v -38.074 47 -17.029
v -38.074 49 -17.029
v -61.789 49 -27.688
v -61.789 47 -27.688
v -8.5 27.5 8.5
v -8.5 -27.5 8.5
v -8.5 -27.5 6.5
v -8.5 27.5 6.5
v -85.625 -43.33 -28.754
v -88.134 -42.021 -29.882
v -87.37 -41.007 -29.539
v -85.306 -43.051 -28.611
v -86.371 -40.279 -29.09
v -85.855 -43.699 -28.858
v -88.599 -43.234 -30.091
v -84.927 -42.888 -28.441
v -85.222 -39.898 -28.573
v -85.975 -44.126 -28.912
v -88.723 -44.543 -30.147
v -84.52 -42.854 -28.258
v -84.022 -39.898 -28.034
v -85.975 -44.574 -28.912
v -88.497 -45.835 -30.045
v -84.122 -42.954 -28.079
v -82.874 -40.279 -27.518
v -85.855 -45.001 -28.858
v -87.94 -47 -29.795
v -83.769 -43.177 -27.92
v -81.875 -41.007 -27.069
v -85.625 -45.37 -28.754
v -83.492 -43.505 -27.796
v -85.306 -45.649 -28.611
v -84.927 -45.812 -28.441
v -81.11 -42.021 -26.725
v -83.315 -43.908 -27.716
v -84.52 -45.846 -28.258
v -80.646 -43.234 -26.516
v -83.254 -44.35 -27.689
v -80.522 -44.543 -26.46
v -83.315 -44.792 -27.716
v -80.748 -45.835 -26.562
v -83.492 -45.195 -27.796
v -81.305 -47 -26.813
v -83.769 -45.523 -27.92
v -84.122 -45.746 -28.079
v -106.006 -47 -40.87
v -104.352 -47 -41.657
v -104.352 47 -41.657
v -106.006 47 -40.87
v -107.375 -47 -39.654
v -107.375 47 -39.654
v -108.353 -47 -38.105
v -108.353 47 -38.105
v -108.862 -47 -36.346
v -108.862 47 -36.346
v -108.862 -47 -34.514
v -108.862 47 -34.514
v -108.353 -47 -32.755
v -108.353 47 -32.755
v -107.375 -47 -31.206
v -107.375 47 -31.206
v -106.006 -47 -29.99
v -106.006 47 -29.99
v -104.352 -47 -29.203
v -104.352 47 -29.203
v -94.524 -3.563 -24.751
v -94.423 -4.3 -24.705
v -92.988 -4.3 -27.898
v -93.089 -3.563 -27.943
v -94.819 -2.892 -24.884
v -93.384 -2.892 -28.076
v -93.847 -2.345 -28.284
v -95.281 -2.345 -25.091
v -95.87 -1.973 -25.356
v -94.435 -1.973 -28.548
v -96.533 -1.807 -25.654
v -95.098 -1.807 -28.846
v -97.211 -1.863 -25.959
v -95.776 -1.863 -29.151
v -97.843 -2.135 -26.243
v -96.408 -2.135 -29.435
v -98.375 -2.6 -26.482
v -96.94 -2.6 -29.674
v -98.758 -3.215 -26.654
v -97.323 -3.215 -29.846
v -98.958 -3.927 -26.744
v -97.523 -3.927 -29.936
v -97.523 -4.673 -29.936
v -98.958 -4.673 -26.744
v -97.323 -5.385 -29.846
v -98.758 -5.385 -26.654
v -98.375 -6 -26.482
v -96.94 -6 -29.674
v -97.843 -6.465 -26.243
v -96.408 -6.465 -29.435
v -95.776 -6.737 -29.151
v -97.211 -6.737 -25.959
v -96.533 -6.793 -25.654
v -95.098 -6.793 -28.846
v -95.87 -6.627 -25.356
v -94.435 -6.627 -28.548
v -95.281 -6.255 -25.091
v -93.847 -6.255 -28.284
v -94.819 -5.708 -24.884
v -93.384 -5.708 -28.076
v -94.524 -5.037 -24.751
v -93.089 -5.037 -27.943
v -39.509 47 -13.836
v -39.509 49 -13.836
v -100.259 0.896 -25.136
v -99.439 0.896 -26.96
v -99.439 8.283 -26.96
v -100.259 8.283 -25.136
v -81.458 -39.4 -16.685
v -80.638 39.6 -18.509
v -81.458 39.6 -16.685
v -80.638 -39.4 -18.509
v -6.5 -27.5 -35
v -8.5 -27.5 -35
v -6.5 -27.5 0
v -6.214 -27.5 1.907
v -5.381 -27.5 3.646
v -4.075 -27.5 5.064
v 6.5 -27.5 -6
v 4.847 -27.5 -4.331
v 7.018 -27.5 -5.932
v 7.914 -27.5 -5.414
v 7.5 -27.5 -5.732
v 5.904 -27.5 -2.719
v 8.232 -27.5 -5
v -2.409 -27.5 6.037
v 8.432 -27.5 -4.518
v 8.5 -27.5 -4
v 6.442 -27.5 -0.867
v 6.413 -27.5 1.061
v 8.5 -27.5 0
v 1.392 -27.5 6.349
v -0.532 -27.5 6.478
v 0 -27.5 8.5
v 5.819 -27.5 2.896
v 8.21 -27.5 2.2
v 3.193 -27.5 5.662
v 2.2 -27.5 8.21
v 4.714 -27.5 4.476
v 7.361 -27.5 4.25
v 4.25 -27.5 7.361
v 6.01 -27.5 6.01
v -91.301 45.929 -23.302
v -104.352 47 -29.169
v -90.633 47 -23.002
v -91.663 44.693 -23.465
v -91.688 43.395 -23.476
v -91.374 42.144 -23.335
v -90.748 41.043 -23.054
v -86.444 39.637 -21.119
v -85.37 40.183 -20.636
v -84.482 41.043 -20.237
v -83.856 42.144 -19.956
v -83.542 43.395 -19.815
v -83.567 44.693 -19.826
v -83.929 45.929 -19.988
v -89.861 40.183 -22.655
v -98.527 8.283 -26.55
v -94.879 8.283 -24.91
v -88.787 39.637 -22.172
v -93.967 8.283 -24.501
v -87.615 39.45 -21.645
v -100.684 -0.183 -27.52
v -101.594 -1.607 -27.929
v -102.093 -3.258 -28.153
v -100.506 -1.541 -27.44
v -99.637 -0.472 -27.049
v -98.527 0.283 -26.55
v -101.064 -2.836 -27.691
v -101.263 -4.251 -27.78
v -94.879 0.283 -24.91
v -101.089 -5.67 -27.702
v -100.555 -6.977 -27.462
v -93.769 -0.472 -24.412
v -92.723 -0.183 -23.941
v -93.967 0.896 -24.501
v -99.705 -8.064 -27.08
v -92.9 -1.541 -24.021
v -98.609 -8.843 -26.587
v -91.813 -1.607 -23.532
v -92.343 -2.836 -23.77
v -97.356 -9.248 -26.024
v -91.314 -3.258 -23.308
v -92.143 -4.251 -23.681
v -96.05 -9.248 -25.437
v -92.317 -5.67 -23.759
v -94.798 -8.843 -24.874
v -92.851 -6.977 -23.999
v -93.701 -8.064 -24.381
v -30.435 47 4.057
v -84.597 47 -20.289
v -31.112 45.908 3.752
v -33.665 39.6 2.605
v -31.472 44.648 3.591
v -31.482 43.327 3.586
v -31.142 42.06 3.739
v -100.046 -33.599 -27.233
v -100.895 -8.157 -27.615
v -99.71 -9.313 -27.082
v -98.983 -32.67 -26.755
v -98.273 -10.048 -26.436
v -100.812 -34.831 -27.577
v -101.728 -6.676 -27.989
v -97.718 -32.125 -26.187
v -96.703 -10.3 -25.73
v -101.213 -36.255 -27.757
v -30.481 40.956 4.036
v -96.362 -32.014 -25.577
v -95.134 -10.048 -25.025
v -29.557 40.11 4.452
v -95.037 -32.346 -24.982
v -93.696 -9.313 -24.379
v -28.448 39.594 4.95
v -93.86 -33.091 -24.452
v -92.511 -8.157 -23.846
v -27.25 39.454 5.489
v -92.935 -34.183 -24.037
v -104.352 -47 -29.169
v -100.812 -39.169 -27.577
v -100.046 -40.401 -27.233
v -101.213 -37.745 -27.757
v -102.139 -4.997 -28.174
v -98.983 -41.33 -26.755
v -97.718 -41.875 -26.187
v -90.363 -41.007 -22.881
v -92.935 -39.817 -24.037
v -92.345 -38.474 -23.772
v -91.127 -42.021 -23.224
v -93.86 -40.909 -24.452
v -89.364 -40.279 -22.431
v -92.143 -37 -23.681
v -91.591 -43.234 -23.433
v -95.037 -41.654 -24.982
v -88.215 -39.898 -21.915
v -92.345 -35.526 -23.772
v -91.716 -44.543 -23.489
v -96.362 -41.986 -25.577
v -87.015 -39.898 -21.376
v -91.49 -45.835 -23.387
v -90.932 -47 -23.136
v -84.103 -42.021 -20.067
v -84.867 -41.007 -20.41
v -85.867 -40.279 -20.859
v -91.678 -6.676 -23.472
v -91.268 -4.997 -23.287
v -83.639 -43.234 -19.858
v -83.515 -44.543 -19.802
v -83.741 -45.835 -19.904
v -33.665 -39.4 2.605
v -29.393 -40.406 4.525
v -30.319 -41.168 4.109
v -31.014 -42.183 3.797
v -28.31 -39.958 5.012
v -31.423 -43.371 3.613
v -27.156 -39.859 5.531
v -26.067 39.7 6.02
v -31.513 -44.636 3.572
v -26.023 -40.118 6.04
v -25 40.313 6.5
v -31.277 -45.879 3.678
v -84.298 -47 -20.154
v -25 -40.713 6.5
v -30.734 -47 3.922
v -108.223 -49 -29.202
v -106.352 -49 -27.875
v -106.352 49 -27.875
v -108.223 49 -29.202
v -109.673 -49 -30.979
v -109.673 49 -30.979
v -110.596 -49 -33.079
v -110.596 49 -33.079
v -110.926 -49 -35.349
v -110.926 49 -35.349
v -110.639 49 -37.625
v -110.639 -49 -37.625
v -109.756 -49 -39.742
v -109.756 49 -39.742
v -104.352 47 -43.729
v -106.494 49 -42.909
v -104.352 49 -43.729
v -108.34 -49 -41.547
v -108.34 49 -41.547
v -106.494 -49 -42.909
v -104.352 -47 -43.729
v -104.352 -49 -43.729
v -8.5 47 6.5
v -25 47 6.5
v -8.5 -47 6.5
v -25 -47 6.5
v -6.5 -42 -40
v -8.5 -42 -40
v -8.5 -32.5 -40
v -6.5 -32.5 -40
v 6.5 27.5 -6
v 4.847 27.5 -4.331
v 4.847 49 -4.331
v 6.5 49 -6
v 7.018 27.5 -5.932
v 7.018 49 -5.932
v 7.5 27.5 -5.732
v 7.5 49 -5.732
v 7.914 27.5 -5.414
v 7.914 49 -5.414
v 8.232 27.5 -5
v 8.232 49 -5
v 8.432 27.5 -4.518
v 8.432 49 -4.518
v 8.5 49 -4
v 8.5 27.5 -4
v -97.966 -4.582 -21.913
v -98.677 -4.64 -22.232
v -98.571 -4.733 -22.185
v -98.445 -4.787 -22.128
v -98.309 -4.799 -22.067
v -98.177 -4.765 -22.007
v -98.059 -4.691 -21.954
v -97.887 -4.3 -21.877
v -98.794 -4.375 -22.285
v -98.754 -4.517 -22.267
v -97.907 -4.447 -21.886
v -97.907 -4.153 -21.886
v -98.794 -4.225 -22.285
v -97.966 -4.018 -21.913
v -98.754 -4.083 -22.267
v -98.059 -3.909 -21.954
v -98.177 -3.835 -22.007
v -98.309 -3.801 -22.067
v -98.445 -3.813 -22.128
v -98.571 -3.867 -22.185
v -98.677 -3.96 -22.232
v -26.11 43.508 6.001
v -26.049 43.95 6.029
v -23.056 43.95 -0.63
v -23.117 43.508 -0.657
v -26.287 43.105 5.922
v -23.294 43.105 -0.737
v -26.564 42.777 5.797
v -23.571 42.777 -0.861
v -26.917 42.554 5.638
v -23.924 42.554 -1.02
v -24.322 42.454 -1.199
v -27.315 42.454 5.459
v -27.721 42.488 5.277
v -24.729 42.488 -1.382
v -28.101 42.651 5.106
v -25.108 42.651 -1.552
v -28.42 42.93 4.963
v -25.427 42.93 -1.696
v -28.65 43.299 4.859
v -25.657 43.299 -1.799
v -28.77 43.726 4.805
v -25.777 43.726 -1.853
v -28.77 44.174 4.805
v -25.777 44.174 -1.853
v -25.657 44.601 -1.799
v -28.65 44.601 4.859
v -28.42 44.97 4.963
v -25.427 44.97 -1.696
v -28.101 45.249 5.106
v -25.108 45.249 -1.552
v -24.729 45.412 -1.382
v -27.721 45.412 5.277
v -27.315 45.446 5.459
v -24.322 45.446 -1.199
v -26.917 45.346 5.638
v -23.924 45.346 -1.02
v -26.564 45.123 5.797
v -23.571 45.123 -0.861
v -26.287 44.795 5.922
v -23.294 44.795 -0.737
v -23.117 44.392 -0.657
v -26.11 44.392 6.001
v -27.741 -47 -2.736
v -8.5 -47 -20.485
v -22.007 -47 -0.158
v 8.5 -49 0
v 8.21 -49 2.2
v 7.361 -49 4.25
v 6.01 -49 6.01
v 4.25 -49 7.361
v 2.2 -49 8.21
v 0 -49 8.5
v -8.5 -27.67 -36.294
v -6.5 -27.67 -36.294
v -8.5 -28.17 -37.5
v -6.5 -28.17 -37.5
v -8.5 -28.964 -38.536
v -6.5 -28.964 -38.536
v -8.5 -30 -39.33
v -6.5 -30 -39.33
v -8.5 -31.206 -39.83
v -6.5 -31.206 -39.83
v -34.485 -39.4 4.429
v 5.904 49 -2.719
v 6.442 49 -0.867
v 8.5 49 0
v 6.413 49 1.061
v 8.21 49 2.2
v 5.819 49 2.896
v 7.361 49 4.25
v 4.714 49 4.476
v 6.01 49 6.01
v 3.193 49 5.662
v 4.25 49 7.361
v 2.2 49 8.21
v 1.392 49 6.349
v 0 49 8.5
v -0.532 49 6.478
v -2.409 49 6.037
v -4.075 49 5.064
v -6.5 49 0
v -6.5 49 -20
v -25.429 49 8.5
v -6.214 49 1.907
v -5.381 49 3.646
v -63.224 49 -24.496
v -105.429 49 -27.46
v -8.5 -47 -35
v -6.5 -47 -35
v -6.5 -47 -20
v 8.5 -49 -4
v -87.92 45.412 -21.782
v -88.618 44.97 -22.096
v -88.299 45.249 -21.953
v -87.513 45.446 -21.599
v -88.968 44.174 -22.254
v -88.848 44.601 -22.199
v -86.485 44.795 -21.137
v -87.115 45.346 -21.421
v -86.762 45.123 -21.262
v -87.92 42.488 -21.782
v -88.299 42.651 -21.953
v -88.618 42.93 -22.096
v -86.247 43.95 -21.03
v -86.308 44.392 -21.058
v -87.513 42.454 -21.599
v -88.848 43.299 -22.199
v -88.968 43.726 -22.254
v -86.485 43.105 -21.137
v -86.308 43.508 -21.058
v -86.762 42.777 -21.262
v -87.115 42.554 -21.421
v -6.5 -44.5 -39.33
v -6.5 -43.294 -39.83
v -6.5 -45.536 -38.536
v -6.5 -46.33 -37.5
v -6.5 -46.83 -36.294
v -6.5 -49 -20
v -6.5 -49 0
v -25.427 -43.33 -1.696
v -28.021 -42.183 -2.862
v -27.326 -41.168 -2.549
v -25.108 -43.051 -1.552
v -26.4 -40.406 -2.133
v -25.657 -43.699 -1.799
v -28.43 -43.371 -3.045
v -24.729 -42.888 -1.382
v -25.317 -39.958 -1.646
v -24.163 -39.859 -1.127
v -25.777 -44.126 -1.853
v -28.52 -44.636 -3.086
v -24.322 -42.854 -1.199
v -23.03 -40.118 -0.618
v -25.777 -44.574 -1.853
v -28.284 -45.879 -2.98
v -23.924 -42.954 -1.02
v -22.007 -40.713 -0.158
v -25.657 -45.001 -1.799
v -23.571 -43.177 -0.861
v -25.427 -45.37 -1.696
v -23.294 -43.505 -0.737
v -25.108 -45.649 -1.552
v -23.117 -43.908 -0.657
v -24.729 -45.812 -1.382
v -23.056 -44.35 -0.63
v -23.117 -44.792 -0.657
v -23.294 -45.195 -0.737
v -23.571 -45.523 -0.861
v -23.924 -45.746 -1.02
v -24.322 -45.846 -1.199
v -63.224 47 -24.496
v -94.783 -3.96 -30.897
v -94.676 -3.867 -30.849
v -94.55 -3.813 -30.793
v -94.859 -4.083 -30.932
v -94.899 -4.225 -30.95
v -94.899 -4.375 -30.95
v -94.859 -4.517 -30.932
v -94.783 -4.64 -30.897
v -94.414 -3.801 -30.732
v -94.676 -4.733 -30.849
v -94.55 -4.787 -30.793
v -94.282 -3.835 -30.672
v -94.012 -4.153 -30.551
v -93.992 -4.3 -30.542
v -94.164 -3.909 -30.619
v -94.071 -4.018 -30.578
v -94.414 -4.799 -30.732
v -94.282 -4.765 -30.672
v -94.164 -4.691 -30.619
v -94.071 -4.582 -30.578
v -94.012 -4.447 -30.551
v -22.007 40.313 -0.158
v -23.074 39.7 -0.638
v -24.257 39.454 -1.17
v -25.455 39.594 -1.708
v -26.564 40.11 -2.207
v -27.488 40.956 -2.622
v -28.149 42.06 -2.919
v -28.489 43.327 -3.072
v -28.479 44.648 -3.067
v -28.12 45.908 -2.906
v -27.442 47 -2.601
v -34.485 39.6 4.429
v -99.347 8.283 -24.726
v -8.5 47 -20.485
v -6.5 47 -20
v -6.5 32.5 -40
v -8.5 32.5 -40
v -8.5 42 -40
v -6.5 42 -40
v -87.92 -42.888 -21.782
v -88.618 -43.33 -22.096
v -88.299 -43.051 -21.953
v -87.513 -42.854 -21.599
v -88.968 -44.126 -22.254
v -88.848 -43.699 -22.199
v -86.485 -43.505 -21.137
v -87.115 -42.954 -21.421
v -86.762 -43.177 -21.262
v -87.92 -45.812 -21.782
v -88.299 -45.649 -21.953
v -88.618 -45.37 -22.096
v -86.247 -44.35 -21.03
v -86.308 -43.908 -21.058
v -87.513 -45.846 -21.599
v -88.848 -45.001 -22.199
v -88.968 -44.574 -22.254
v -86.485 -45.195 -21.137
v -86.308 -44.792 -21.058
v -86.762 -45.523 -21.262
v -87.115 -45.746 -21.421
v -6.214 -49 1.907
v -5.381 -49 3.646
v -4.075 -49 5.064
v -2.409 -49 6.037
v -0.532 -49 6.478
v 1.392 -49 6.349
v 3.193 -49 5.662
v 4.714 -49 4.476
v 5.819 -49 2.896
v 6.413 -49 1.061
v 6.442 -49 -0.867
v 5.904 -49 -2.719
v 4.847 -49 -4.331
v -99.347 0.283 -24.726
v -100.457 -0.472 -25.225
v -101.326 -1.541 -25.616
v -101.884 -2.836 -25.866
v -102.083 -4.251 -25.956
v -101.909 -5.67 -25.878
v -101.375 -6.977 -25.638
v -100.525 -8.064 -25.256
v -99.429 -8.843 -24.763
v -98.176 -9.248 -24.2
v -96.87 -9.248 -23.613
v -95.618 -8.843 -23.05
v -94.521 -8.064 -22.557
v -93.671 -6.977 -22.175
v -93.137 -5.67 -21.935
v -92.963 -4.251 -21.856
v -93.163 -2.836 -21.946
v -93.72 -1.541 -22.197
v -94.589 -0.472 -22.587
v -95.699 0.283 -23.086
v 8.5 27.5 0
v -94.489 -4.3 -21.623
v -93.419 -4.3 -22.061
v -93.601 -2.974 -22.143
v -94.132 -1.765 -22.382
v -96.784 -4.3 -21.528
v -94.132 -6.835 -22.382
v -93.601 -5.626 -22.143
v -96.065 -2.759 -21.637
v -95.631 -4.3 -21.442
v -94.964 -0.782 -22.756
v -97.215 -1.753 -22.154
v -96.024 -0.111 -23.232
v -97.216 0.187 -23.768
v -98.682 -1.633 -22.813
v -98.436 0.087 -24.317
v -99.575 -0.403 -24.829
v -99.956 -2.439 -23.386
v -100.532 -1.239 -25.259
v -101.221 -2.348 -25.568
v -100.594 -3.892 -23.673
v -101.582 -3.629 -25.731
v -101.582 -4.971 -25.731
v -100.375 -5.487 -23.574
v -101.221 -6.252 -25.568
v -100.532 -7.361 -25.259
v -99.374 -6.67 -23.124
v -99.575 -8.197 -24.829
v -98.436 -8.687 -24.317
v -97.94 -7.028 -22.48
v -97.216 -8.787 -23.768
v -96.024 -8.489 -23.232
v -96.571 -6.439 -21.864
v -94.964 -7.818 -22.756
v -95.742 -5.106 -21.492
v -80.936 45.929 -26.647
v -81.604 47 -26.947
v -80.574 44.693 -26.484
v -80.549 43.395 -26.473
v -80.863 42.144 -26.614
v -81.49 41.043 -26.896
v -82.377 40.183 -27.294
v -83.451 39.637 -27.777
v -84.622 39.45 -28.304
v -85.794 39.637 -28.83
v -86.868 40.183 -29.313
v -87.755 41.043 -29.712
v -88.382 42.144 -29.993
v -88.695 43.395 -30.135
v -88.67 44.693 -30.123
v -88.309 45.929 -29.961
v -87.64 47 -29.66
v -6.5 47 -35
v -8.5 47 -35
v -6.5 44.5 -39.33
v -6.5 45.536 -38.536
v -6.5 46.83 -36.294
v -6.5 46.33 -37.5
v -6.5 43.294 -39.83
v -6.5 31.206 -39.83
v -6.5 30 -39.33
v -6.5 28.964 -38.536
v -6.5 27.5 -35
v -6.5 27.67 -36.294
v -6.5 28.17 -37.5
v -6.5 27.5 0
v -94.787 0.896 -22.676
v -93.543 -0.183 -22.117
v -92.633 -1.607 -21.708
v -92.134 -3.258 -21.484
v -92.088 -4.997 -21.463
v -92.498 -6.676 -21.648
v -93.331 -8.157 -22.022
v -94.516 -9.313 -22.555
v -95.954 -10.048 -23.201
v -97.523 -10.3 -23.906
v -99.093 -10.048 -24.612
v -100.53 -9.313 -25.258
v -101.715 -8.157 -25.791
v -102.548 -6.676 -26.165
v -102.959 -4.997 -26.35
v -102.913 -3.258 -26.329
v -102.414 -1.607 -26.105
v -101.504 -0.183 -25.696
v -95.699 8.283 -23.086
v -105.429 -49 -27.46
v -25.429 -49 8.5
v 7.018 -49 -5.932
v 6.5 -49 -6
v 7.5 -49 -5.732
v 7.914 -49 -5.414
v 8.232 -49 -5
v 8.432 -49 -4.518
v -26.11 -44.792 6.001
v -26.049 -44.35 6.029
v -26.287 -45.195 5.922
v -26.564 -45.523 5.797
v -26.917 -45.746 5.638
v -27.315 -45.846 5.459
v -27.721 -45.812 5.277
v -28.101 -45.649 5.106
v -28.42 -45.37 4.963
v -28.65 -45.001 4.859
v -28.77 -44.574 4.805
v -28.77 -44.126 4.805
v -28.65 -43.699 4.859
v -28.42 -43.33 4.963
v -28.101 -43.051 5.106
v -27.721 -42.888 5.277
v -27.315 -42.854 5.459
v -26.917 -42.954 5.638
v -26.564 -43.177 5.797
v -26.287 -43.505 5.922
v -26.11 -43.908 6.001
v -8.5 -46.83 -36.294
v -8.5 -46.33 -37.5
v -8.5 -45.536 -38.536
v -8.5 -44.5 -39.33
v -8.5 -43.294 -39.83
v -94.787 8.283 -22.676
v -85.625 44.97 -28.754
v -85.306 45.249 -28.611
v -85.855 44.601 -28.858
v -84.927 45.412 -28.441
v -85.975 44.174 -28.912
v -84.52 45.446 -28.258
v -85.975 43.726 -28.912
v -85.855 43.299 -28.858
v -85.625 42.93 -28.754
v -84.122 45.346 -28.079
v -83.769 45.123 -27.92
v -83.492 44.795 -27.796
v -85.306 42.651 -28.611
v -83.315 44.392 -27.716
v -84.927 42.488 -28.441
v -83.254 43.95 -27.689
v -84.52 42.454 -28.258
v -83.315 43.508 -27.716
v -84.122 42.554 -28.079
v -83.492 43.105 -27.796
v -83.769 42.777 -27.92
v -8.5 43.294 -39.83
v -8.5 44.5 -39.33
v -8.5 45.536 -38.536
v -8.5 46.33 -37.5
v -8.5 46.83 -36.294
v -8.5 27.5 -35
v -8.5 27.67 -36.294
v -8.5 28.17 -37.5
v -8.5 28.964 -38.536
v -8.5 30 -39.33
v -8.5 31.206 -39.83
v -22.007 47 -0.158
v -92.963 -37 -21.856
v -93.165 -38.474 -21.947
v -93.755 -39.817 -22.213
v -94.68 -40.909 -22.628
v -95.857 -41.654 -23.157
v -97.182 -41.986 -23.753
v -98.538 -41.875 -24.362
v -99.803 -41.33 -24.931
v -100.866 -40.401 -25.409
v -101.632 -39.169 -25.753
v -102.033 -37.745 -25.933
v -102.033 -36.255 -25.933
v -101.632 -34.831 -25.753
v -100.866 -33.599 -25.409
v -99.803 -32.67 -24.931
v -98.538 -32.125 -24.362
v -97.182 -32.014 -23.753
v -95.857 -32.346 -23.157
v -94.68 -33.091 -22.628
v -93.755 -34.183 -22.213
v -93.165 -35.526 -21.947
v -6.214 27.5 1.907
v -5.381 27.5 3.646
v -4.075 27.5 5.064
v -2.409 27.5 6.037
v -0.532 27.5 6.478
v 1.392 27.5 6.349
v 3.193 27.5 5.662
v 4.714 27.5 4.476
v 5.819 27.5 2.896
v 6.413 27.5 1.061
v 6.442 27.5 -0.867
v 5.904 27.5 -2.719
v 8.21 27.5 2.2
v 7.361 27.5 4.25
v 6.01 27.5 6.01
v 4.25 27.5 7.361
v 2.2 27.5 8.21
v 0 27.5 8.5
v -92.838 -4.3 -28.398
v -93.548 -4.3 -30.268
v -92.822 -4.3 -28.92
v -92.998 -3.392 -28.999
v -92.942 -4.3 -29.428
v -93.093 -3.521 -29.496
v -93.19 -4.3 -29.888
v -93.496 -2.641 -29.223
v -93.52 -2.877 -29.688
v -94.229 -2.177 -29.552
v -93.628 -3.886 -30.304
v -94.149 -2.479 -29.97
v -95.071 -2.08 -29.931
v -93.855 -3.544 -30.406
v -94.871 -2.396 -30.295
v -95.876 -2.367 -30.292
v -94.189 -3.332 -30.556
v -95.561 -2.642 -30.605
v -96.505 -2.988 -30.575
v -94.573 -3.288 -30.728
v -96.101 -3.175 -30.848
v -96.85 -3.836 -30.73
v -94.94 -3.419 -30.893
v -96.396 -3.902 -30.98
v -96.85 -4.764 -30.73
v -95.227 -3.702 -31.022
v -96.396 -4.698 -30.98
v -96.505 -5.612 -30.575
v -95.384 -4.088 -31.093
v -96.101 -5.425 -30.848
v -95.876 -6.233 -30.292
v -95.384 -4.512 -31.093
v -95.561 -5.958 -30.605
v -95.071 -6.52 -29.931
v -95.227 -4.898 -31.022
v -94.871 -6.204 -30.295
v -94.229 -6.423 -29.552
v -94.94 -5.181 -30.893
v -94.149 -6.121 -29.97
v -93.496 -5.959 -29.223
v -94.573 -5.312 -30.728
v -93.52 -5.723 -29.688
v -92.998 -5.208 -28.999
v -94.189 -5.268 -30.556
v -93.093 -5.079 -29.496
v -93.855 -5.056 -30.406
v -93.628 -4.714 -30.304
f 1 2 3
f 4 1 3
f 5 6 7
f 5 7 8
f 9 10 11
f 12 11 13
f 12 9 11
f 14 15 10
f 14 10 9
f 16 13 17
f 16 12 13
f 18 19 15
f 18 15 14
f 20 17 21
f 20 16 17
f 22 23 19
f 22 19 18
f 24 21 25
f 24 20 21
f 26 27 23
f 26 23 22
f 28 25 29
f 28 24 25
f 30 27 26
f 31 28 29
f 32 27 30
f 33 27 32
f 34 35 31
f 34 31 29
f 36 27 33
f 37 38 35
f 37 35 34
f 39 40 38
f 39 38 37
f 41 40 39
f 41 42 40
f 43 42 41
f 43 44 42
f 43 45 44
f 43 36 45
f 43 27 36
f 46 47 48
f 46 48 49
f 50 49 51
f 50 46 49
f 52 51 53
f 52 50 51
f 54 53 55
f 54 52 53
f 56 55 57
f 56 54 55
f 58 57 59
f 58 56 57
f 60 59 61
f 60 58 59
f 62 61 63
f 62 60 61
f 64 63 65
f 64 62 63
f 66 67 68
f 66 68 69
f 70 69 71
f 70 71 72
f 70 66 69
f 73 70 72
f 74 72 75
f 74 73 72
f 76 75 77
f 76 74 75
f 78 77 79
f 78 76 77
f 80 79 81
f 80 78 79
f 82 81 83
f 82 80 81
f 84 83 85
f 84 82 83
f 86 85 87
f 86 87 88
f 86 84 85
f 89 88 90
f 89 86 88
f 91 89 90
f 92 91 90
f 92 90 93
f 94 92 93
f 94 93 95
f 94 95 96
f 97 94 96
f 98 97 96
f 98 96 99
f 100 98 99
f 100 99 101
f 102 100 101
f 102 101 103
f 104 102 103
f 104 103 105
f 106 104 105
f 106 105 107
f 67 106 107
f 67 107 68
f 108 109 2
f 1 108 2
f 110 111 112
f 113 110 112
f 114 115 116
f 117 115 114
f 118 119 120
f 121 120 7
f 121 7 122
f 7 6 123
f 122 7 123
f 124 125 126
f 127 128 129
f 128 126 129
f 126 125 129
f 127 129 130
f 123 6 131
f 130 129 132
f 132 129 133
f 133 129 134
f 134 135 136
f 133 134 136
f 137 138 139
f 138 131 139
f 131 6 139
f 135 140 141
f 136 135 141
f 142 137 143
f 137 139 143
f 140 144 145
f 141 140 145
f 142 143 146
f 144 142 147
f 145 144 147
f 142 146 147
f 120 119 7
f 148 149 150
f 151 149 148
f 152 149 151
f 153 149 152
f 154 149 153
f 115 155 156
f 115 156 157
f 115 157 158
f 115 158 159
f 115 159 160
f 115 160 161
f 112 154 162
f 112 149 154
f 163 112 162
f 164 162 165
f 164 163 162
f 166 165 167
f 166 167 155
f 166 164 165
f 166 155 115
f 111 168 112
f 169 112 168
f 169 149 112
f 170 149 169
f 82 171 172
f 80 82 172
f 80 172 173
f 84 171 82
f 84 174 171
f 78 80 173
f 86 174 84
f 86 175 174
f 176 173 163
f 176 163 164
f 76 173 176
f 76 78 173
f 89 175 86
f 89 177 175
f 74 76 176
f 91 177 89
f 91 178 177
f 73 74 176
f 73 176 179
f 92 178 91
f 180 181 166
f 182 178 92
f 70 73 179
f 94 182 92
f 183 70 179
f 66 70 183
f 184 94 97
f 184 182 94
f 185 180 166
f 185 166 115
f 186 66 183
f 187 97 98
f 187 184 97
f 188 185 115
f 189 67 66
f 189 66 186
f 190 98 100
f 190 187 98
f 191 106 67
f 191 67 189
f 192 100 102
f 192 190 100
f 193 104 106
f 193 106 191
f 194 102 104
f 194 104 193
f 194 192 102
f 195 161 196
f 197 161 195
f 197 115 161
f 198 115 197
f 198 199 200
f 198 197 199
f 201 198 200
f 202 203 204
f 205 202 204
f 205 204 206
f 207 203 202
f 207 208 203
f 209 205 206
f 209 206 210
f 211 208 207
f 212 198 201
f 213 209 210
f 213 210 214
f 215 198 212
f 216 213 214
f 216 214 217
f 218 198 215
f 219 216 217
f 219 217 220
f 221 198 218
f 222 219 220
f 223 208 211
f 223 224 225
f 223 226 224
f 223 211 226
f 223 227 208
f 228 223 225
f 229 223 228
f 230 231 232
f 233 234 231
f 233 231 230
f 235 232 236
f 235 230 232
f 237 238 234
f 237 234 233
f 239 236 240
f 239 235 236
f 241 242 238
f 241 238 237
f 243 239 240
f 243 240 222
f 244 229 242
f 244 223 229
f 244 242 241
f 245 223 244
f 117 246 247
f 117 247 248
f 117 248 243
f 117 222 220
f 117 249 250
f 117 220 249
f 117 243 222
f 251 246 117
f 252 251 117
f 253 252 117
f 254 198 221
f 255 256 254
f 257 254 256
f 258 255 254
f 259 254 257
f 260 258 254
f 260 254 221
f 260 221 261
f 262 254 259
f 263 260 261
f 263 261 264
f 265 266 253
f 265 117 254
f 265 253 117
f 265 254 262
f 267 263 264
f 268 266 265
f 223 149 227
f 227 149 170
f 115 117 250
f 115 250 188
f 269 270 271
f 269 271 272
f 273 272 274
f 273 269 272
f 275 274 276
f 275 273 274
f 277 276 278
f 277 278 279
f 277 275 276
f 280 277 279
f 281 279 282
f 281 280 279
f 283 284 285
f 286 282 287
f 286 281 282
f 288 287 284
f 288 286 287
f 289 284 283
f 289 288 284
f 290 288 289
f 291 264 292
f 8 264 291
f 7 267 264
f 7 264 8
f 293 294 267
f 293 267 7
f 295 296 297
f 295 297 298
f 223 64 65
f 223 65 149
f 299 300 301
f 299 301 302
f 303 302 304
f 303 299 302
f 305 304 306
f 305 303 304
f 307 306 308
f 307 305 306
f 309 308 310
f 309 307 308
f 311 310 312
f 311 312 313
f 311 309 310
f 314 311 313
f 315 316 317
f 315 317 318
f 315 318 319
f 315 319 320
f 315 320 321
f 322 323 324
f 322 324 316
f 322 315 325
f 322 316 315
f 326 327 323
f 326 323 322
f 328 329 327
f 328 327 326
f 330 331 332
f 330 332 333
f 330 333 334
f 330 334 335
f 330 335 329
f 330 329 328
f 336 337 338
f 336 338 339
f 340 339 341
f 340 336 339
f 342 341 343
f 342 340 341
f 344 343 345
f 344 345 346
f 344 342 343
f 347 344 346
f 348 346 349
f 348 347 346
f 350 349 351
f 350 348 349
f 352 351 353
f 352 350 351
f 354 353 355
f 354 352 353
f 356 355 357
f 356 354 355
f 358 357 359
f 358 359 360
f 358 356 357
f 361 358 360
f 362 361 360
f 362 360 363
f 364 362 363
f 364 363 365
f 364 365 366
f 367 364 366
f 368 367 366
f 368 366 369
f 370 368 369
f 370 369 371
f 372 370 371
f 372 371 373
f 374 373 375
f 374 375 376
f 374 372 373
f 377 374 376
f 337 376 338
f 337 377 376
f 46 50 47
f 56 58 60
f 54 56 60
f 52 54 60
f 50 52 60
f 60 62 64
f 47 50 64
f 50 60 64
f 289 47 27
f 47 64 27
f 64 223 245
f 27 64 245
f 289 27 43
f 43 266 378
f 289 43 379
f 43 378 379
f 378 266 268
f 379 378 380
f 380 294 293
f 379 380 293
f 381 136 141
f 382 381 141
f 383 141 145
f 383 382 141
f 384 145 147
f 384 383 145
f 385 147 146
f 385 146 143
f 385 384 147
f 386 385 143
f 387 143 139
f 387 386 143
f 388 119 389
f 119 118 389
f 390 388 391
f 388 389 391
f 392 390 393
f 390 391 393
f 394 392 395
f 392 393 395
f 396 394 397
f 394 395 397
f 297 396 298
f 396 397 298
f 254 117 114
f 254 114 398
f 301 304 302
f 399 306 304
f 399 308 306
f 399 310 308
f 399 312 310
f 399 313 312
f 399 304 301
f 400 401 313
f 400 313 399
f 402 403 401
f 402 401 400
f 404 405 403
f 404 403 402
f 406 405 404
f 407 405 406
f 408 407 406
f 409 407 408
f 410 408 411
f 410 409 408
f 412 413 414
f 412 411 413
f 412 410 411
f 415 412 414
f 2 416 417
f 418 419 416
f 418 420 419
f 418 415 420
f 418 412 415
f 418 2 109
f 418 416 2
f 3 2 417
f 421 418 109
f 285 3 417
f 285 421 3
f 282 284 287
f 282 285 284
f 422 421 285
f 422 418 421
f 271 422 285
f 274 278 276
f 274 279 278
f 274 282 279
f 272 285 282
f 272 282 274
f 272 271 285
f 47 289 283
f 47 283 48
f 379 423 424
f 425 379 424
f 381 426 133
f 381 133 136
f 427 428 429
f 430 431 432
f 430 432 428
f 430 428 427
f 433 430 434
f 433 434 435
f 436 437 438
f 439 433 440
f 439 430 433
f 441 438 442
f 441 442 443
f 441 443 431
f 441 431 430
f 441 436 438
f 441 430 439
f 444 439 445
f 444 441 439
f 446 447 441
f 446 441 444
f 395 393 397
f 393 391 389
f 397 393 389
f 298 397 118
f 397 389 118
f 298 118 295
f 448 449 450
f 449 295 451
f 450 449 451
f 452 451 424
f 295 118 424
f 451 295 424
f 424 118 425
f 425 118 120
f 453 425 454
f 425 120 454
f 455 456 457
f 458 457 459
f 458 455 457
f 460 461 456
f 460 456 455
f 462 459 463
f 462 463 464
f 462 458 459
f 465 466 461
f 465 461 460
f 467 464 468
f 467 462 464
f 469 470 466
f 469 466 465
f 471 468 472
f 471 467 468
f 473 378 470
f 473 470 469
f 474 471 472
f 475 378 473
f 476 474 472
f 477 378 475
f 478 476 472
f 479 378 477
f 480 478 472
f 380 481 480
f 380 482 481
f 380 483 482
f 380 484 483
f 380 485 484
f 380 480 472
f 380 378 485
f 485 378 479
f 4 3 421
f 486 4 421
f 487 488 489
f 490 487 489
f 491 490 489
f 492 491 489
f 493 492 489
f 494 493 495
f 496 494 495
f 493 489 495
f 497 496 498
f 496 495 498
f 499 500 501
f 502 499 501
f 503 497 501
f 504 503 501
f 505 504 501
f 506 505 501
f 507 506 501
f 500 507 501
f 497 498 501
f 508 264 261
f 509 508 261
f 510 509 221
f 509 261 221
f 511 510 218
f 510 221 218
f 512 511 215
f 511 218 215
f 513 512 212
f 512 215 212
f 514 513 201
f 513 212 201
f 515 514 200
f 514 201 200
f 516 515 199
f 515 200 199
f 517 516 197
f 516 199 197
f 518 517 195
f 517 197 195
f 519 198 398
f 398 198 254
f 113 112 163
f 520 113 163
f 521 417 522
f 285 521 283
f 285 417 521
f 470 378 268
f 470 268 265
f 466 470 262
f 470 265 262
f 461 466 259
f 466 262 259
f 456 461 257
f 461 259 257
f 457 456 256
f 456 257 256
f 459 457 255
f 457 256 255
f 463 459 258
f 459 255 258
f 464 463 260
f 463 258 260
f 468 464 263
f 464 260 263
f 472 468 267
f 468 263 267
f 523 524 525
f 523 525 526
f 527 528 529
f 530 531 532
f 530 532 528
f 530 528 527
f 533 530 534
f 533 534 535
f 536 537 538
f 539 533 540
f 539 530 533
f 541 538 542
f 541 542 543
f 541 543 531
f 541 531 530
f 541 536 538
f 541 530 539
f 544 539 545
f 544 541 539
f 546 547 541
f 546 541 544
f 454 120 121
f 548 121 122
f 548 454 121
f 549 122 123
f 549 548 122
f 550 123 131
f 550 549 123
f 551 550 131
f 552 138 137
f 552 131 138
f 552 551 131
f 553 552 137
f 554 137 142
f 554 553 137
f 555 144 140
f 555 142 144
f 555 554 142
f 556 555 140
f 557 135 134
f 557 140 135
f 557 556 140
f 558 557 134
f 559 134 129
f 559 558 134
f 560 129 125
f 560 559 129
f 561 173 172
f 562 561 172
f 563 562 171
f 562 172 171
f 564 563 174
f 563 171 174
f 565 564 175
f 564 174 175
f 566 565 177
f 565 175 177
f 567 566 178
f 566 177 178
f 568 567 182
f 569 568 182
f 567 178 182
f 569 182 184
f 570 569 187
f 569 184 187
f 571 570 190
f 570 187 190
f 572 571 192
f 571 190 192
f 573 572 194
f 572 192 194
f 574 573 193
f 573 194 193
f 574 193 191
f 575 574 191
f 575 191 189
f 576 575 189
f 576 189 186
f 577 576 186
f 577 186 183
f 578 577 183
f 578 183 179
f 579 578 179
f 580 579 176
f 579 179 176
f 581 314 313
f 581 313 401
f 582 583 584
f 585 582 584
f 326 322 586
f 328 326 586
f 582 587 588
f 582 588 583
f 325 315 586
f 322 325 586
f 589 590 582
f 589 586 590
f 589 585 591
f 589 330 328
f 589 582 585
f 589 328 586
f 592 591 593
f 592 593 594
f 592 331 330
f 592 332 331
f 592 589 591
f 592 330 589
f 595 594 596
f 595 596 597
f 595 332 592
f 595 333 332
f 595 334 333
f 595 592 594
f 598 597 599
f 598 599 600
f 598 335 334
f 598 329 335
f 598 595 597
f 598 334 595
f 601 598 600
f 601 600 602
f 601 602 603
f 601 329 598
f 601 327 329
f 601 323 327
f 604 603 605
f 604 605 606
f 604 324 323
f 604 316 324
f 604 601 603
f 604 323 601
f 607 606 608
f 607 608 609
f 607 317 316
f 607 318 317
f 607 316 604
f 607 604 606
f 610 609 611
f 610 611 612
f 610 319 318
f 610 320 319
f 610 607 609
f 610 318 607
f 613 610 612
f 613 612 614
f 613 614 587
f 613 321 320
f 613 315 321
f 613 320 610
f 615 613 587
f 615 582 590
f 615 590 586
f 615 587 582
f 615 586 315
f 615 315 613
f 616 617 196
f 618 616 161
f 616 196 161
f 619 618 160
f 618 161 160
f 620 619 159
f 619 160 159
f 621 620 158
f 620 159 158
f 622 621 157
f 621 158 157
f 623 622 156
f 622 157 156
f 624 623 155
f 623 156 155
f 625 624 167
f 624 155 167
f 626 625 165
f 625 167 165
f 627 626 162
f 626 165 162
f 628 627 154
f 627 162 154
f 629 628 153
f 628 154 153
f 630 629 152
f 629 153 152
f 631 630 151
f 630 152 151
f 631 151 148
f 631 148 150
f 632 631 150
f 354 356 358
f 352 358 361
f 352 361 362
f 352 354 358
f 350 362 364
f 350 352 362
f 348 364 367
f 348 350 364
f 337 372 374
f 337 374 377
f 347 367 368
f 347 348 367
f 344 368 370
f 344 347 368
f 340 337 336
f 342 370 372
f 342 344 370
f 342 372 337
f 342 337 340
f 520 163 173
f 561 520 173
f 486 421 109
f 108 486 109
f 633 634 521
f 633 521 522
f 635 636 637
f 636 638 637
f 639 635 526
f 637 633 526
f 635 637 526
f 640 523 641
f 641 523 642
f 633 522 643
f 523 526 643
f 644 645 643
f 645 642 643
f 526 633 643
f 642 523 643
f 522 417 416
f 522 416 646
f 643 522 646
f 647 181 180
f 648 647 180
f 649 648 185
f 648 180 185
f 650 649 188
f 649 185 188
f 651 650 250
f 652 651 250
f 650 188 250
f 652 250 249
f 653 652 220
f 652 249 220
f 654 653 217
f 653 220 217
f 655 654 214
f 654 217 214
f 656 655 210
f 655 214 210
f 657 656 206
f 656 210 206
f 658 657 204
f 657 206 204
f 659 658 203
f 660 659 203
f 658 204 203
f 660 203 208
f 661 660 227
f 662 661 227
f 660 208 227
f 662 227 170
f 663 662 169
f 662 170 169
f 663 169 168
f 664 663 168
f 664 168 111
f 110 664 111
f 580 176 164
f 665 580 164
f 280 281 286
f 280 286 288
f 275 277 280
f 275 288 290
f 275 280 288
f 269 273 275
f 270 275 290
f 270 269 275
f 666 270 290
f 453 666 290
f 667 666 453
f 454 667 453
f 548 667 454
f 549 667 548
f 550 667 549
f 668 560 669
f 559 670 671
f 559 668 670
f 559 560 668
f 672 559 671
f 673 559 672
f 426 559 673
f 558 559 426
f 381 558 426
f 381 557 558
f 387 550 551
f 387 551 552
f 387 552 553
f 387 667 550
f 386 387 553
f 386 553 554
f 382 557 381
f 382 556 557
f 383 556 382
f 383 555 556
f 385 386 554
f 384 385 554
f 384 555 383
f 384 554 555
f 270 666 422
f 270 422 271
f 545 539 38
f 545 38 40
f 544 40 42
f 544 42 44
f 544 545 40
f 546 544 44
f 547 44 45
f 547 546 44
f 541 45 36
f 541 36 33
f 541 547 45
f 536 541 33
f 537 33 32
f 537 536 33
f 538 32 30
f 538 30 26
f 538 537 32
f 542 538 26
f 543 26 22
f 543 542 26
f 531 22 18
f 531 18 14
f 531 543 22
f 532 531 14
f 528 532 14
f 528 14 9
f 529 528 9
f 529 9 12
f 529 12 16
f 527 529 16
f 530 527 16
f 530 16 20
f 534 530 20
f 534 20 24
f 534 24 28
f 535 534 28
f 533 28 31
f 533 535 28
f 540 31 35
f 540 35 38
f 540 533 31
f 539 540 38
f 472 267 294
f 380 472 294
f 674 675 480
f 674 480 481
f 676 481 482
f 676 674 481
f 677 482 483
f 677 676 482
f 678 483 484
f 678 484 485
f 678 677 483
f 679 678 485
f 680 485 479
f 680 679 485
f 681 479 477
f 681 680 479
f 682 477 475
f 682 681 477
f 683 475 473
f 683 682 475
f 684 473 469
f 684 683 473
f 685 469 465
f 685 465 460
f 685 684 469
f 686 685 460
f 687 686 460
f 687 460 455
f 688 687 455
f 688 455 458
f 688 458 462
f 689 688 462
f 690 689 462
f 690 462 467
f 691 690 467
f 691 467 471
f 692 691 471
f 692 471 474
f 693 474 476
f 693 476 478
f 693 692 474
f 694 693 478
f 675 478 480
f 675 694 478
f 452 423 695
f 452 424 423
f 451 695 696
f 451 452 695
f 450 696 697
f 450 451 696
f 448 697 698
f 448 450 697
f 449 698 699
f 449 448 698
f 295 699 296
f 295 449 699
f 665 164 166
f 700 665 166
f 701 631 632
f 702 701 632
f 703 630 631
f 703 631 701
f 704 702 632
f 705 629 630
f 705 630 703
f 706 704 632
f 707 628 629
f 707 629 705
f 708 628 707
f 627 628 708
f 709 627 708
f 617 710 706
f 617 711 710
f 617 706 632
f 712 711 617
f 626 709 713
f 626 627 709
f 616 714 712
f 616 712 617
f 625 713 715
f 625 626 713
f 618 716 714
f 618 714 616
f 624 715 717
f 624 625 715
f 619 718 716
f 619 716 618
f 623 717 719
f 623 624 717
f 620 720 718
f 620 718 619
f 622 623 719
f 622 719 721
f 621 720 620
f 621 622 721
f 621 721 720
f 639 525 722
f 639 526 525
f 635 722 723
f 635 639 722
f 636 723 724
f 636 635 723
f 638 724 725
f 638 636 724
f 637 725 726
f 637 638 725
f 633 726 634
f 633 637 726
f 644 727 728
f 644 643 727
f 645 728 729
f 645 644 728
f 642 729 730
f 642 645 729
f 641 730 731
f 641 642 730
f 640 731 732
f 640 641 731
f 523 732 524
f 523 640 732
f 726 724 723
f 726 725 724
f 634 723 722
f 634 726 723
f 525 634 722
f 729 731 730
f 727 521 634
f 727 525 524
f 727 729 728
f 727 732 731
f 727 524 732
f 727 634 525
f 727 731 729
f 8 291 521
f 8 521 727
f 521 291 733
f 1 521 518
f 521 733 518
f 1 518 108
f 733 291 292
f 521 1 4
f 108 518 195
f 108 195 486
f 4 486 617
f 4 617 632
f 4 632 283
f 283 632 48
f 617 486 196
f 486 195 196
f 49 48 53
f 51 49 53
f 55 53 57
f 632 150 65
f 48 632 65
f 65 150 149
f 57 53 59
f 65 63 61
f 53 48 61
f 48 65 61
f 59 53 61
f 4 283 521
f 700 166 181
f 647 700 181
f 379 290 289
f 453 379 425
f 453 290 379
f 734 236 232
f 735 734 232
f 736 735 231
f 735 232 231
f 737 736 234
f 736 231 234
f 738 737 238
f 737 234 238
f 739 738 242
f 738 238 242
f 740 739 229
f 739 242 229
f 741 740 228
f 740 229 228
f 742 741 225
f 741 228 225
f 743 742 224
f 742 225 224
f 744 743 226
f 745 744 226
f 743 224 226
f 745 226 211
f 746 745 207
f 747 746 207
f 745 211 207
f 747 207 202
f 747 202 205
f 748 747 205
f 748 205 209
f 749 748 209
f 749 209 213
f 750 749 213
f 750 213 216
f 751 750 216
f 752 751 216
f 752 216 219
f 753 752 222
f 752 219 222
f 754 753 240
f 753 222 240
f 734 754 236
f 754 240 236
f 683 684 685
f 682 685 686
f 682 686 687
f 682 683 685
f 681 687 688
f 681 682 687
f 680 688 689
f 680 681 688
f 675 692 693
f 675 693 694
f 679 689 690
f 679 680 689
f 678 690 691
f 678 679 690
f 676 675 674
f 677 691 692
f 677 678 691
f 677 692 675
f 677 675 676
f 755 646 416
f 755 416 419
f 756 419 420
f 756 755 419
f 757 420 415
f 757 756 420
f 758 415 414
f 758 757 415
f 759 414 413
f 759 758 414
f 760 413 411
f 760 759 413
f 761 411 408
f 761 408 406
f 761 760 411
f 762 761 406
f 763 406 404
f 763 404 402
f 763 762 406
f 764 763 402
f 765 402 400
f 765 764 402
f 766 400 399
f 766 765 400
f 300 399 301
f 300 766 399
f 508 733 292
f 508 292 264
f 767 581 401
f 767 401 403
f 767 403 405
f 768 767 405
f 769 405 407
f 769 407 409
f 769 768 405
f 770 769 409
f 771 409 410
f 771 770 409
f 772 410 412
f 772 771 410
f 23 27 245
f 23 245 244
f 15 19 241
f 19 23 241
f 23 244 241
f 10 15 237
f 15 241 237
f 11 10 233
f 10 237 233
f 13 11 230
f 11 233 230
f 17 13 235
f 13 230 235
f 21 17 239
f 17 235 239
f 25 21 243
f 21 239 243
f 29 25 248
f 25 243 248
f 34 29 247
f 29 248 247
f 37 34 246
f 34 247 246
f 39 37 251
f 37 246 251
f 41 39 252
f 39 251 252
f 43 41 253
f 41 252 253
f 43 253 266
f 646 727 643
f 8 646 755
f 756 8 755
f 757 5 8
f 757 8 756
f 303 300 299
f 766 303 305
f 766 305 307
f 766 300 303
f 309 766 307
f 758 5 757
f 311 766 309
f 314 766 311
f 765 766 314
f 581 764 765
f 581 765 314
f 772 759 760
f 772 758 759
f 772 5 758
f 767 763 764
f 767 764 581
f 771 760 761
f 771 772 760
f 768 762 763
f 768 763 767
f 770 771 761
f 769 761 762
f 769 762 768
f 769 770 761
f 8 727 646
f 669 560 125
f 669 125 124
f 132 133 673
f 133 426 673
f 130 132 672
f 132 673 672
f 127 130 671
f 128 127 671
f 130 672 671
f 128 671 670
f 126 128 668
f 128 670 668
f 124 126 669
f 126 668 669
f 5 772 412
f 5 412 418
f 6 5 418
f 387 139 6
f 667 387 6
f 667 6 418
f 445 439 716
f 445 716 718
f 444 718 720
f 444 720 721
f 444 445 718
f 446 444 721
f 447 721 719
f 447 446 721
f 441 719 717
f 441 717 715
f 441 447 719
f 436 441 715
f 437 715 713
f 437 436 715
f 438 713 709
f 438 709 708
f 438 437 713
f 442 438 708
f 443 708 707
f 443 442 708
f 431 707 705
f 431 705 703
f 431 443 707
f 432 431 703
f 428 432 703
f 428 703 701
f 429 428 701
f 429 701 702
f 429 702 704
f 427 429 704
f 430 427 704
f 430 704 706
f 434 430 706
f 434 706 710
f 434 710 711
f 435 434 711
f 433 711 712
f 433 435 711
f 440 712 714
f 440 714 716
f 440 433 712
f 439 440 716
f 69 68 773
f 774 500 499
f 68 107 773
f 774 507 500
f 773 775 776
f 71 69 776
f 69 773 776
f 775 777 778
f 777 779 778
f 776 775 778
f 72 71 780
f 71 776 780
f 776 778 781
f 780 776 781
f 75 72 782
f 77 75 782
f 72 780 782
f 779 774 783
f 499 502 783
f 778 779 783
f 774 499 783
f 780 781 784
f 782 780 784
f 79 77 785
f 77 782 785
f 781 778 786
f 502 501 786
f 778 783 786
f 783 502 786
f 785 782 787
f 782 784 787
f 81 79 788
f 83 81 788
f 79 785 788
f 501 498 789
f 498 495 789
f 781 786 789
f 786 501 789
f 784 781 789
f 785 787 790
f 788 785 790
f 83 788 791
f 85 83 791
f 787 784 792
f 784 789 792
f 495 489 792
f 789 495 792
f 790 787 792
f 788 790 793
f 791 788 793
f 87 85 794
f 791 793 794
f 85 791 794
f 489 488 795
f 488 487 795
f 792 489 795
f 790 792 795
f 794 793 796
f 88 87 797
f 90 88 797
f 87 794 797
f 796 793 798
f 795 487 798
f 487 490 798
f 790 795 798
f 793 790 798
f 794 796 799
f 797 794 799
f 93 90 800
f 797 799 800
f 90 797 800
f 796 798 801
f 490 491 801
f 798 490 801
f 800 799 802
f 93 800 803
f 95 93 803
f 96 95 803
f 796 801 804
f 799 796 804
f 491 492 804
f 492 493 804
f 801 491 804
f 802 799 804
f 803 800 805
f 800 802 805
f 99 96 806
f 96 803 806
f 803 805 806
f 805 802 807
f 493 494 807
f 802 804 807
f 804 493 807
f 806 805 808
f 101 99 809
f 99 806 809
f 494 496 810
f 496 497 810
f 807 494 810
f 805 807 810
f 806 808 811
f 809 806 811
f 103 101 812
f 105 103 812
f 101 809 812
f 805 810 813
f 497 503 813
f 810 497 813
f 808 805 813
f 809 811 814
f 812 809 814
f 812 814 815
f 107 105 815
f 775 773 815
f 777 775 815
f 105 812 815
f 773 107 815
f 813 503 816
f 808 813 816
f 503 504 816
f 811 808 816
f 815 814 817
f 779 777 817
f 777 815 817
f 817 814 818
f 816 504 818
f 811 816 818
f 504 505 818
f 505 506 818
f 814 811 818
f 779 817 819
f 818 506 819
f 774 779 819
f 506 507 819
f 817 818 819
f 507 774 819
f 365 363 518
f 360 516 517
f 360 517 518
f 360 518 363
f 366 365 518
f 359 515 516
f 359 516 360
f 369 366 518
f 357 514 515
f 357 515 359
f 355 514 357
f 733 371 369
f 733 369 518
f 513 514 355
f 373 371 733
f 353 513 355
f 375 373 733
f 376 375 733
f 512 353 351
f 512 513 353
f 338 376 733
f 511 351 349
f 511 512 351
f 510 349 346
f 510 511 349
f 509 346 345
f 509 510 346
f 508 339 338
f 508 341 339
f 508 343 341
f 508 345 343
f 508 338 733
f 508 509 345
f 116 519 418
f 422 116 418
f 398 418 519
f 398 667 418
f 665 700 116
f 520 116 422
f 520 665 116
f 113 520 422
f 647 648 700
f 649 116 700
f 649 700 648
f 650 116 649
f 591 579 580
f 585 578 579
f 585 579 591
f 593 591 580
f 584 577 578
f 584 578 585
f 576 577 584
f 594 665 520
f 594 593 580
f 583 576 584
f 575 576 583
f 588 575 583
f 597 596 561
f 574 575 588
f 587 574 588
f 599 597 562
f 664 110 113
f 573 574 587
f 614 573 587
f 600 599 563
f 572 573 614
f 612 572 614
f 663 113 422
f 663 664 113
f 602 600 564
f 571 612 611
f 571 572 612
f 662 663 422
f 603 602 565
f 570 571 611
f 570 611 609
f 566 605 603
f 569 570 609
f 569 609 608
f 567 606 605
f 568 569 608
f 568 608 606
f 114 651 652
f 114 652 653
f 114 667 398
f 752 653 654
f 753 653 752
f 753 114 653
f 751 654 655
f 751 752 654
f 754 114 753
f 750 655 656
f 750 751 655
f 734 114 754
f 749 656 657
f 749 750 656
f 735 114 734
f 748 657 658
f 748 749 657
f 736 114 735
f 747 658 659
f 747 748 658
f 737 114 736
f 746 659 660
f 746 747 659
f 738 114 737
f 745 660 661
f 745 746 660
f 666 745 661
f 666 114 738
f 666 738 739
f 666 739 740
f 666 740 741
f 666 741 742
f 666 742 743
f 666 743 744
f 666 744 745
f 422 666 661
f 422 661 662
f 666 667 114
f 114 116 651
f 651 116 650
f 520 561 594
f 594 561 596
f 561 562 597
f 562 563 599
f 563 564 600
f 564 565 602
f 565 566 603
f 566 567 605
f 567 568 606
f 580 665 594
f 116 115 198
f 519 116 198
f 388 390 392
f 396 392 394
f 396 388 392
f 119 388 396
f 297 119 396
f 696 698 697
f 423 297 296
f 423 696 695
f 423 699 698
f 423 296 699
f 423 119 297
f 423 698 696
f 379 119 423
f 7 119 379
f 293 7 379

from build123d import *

# Parameters (mm, degrees)
F1_DEPTH  = 49
F2_W      = 51.5
F2_H      = 79
F3_DEPTH  = 2
F2_R      = 1.5
F2_R_2    = 4.5
F4_DEPTH  = 7.3
F6_DEPTH  = 2
F8_DEPTH  = 2
F2_R_3    = 5
F9_DEPTH  = 2
F11_DEPTH = 2
F12_W     = 8.5
F12_H     = 55
F13_DEPTH = 40
F14_R     = 1.99999
F15_W     = 2
F15_H     = 19.5
F16_DEPTH = 20
F17_W     = 2
F17_H     = 19.5
F18_DEPTH = 20
F19_R     = 5
F20_DEPTH = 2
F21_R     = 2.5
F22_DEPTH = 7.5
F21_R_2   = 4.5
F23_DEPTH = 2
F25_R     = 2


# Not quite as in the source:
# - a fillet or chamfer that OpenCascade refuses, or shapes differently, is made with other operations: its cross-section is extruded or revolved along the edge and cut away or added
# - a fillet or chamfer is up to 0.001 mm smaller than in the source, because OpenCascade refuses the exact size
# - a feature names something its author has since deleted; it is built from what else it names


with BuildPart() as f1:
    # F0 (on Front) → F1 (new body, symmetric)
    with BuildSketch(Plane.XZ):
        with BuildLine():
            Line((-25, 6.5), (-8.5, 6.5))
            Line((-8.5, 6.5), (-8.5, 0))
            Line((-8.5, 0), (-8.5, -20))
            Line((-8.5, -20), (-6.5, -20))
            Line((-6.5, -20), (-6.5, 0))
            ThreePointArc((-6.5, 0), (2.3181097502, 6.072591472), (4.8465745188, -4.3313641539))
            Line((4.8465745188, -4.3313641539), (6.5, -6))
            Line((6.5, -6), (8.5, -6))
            Line((8.5, -6), (8.5, 0))
            ThreePointArc((8.5, 0), (6.0104076401, 6.0104076401), (0, 8.5))
            Line((0, 8.5), (-25.4288327804, 8.5))
            Line((-25.4288327804, 8.5), (-105.428633061, -27.4597649849))
            Line((-105.428633061, -27.4597649849), (-106.3520655314, -27.8748462039))
            ThreePointArc((-106.3520655314, -27.8748462039), (-110.8598066956, -36.4968976222), (-104.3520655314, -43.7293803221))
            Line((-104.3520655314, -43.7293803221), (-104.3520655314, -42.85))
            Line((-104.3520655314, -42.85), (-104.3520655314, -41.6571435378))
            ThreePointArc((-104.3520655314, -41.6571435378), (-108.9268429391, -35.4298576938), (-104.3520655314, -29.2025718498))
            Line((-104.3520655314, -29.2025718498), (-104.3520655314, -29.1686093911))
            Line((-104.3520655314, -29.1686093911), (-25, 6.5))
        make_face()
    extrude(amount=F1_DEPTH, both=True)

    # F2 (on face) → F3 (cut)
    with BuildSketch(Plane(origin=(-6.6328046362, 0, 14.75602097), x_dir=(0.9120927073, 0, 0.409984016), z_dir=(0.409984016, 0, -0.9120927073))):
        with Locations((-55.3874215775, -0.1)):
            Rectangle(F2_W, F2_H)
    extrude(amount=-F3_DEPTH, mode=Mode.SUBTRACT)

    # F2 (on face) → F4 (join)
    with BuildSketch(Plane(origin=(-6.6328046362, 0, 14.75602097), x_dir=(0.9120927073, 0, 0.409984016), z_dir=(0.409984016, 0, -0.9120927073))):
        with BuildLine():
            Line((-20.1374215775, 40.7130369812), (-20.1374215775, 47.9869630188))
            ThreePointArc((-20.1374215775, 47.9869630188), (-27.2874215775, 44.35), (-20.1374215775, 40.7130369812))
        make_face()
        with Locations((-22.7874215775, 44.35)):
            Circle(F2_R, mode=Mode.SUBTRACT)
        with BuildLine():
            Line((-20.1374215775, -47.5869630188), (-20.1374215775, -40.3130369812))
            ThreePointArc((-20.1374215775, -40.3130369812), (-27.2874215775, -43.95), (-20.1374215775, -47.5869630188))
        make_face()
        with Locations((-22.7874215775, -43.95)):
            Circle(F2_R, mode=Mode.SUBTRACT)
        with Locations((-88.7874215775, -43.95)):
            Circle(F2_R_2)
        with Locations((-88.7874215775, -43.95)):
            Circle(F2_R, mode=Mode.SUBTRACT)
        with Locations((-88.7874215775, 44.35)):
            Circle(F2_R_2)
        with Locations((-88.7874215775, 44.35)):
            Circle(F2_R, mode=Mode.SUBTRACT)
    extrude(amount=F4_DEPTH)

    # F5 (on face) → F6 (join)
    with BuildSketch(Plane.XZ.offset(49)):
        with BuildLine():
            Line((-104.3520655314, -43.7293803221), (-6.5, -20))
            Line((-6.5, -20), (-8.5, -20))
            Line((-8.5, -20), (-8.5, 6.5))
            Line((-8.5, 6.5), (-25, 6.5))
            Line((-25, 6.5), (-104.3520655314, -29.1686093911))
            Line((-104.3520655314, -29.1686093911), (-104.3520655314, -29.2025718498))
            ThreePointArc((-104.3520655314, -29.2025718498), (-108.9268429391, -35.4298576938), (-104.3520655314, -41.6571435378))
            Line((-104.3520655314, -41.6571435378), (-104.3520655314, -43.7293803221))
        make_face()
    extrude(amount=-F6_DEPTH)

    # F7 (on face) → F8 (join)
    with BuildSketch(Plane(origin=(0, 49, 0), x_dir=(-1, 0, 0), z_dir=(0, 1, 0))):
        with BuildLine():
            Line((8.5, -20), (6.5, -20))
            Line((6.5, -20), (104.3520655314, -43.7293803221))
            Line((104.3520655314, -43.7293803221), (104.3520655314, -41.6571435378))
            ThreePointArc((104.3520655314, -41.6571435378), (108.9268429391, -35.4298576938), (104.3520655314, -29.2025718498))
            Line((104.3520655314, -29.2025718498), (104.3520655314, -29.1686093911))
            Line((104.3520655314, -29.1686093911), (25, 6.5))
            Line((25, 6.5), (8.5, 6.5))
            Line((8.5, 6.5), (8.5, -20))
        make_face()
    extrude(amount=-F8_DEPTH)

    # F2 (on face) → F9 (cut)
    with BuildSketch(Plane(origin=(-6.6328046362, 0, 14.75602097), x_dir=(0.9120927073, 0, 0.409984016), z_dir=(0.409984016, 0, -0.9120927073))):
        with Locations((-98.7513456427, 37)):
            Circle(F2_R_3)
    extrude(amount=-F9_DEPTH, mode=Mode.SUBTRACT)

    # F10 (on face) → F11 (cut)
    with BuildSketch(Plane(origin=(0, 49, 0), x_dir=(-1, 0, 0), z_dir=(0, 1, 0))):
        Polygon((63.2235160953, -24.4957862935), (39.5091057066, -13.8362018777), (38.0741616506, -17.0285263531), (61.7885720393, -27.6881107689), align=None)
    extrude(amount=-F11_DEPTH, mode=Mode.SUBTRACT)

    # F12 (on face) → F13 (cut)
    with BuildSketch(Plane.XY.offset(8.5)):
        with Locations((4.25, 0)):
            Rectangle(F12_W, F12_H)
        with Locations((-4.25, 0)):
            Rectangle(F12_W, F12_H)
    extrude(amount=-F13_DEPTH, mode=Mode.SUBTRACT)

    # F14 (radius 2 in the source; OpenCascade refuses exactly that, so slightly less here)
    f14_edges = [f1.edges().sort_by_distance(p)[0] for p in [
        (8.5, 38.25, -6),
        (8.5, -38.25, -6),
    ]]
    fillet(f14_edges, radius=F14_R)

    # F15 (on face) → F16 (join)
    with BuildSketch(Plane(origin=(0, 0, -20), x_dir=(1, 0, 0), z_dir=(0, 0, -1))):
        with Locations((-7.5, 37.25)):
            Rectangle(F15_W, F15_H)
    extrude(amount=F16_DEPTH)

    # F17 (on face) → F18 (join)
    with BuildSketch(Plane(origin=(0, 0, -20), x_dir=(1, 0, 0), z_dir=(0, 0, -1))):
        with Locations((-7.5, -37.25)):
            Rectangle(F17_W, F17_H)
    extrude(amount=F18_DEPTH)

    # F19
    f19_edges = [f1.edges().sort_by_distance(p)[0] for p in [
        (-7.5, 47, -40),
        (-7.5, 27.5, -40),
        (-7.5, -27.5, -40),
        (-7.5, -47, -40),
    ]]
    fillet(f19_edges, radius=F19_R)

    # F2 (on face) → F20 (cut)
    with BuildSketch(Plane(origin=(-6.6328046362, 0, 14.75602097), x_dir=(0.9120927073, 0, 0.409984016), z_dir=(0.409984016, 0, -0.9120927073))):
        with BuildLine():
            ThreePointArc((-100.7513456427, -0.282575695), (-98.7513456427, 9.3), (-96.7513456427, -0.282575695))
            Line((-96.7513456427, -0.282575695), (-96.7513456427, -8.282575695))
            Line((-96.7513456427, -8.282575695), (-95.7513456427, -8.282575695))
            Line((-95.7513456427, -8.282575695), (-95.7513456427, -0.8961524227))
            ThreePointArc((-95.7513456427, -0.8961524227), (-98.7513456427, 10.3), (-101.7513456427, -0.8961524227))
            Line((-101.7513456427, -0.8961524227), (-101.7513456427, -8.282575695))
            Line((-101.7513456427, -8.282575695), (-100.7513456427, -8.282575695))
            Line((-100.7513456427, -8.282575695), (-100.7513456427, -0.282575695))
        make_face()
    extrude(amount=-F20_DEPTH, mode=Mode.SUBTRACT)

    # F21 (on face) → F22 (join)
    with BuildSketch(Plane(origin=(-7.4527726682, 0, 16.5802063845), x_dir=(0.9120927073, 0, 0.409984016), z_dir=(-0.409984016, 0, 0.9120927073))):
        with Locations((-98.7513456427, -4.3)):
            Circle(F21_R)
    extrude(amount=-F22_DEPTH)

    # F21 (on face) → F23 (join)
    with BuildSketch(Plane(origin=(-7.4527726682, 0, 16.5802063845), x_dir=(0.9120927073, 0, 0.409984016), z_dir=(-0.409984016, 0, 0.9120927073))):
        with Locations((-98.7513456427, -4.3)):
            Circle(F21_R_2)
        with Locations((-98.7513456427, -4.3)):
            Circle(F21_R, mode=Mode.SUBTRACT)
        with Locations((-98.7513456427, -4.3)):
            Circle(F21_R)
    extrude(amount=F23_DEPTH)

    # F24: fillet of radius 5 on 1 edges, made by hand

    # F24_s1 → F24_t2 (revolve, cut)
    with BuildSketch(Plane.XZ.offset(4.3)):
        with BuildLine():
            ThreePointArc((-93.4187376781, -22.0613388145), (-95.6311594228, -21.4417982804), (-97.8870765391, -21.877089464))
            Line((-97.8870765391, -21.877089464), (-94.2387057101, -20.2371534))
            Line((-94.2387057101, -20.2371534), (-93.4187376781, -22.0613388145))
        make_face()
    revolve(axis=Axis((-98.3431228928, -4.3, -22.082081472), (-0.409984016, 0, 0.9120927073)), mode=Mode.SUBTRACT)

    # F25
    f25_edges = [f1.edges().sort_by_distance(p)[0] for p in [
        (-96.728507, -4.3, -31.771922),
    ]]
    fillet(f25_edges, radius=F25_R)


solid = f1.part
